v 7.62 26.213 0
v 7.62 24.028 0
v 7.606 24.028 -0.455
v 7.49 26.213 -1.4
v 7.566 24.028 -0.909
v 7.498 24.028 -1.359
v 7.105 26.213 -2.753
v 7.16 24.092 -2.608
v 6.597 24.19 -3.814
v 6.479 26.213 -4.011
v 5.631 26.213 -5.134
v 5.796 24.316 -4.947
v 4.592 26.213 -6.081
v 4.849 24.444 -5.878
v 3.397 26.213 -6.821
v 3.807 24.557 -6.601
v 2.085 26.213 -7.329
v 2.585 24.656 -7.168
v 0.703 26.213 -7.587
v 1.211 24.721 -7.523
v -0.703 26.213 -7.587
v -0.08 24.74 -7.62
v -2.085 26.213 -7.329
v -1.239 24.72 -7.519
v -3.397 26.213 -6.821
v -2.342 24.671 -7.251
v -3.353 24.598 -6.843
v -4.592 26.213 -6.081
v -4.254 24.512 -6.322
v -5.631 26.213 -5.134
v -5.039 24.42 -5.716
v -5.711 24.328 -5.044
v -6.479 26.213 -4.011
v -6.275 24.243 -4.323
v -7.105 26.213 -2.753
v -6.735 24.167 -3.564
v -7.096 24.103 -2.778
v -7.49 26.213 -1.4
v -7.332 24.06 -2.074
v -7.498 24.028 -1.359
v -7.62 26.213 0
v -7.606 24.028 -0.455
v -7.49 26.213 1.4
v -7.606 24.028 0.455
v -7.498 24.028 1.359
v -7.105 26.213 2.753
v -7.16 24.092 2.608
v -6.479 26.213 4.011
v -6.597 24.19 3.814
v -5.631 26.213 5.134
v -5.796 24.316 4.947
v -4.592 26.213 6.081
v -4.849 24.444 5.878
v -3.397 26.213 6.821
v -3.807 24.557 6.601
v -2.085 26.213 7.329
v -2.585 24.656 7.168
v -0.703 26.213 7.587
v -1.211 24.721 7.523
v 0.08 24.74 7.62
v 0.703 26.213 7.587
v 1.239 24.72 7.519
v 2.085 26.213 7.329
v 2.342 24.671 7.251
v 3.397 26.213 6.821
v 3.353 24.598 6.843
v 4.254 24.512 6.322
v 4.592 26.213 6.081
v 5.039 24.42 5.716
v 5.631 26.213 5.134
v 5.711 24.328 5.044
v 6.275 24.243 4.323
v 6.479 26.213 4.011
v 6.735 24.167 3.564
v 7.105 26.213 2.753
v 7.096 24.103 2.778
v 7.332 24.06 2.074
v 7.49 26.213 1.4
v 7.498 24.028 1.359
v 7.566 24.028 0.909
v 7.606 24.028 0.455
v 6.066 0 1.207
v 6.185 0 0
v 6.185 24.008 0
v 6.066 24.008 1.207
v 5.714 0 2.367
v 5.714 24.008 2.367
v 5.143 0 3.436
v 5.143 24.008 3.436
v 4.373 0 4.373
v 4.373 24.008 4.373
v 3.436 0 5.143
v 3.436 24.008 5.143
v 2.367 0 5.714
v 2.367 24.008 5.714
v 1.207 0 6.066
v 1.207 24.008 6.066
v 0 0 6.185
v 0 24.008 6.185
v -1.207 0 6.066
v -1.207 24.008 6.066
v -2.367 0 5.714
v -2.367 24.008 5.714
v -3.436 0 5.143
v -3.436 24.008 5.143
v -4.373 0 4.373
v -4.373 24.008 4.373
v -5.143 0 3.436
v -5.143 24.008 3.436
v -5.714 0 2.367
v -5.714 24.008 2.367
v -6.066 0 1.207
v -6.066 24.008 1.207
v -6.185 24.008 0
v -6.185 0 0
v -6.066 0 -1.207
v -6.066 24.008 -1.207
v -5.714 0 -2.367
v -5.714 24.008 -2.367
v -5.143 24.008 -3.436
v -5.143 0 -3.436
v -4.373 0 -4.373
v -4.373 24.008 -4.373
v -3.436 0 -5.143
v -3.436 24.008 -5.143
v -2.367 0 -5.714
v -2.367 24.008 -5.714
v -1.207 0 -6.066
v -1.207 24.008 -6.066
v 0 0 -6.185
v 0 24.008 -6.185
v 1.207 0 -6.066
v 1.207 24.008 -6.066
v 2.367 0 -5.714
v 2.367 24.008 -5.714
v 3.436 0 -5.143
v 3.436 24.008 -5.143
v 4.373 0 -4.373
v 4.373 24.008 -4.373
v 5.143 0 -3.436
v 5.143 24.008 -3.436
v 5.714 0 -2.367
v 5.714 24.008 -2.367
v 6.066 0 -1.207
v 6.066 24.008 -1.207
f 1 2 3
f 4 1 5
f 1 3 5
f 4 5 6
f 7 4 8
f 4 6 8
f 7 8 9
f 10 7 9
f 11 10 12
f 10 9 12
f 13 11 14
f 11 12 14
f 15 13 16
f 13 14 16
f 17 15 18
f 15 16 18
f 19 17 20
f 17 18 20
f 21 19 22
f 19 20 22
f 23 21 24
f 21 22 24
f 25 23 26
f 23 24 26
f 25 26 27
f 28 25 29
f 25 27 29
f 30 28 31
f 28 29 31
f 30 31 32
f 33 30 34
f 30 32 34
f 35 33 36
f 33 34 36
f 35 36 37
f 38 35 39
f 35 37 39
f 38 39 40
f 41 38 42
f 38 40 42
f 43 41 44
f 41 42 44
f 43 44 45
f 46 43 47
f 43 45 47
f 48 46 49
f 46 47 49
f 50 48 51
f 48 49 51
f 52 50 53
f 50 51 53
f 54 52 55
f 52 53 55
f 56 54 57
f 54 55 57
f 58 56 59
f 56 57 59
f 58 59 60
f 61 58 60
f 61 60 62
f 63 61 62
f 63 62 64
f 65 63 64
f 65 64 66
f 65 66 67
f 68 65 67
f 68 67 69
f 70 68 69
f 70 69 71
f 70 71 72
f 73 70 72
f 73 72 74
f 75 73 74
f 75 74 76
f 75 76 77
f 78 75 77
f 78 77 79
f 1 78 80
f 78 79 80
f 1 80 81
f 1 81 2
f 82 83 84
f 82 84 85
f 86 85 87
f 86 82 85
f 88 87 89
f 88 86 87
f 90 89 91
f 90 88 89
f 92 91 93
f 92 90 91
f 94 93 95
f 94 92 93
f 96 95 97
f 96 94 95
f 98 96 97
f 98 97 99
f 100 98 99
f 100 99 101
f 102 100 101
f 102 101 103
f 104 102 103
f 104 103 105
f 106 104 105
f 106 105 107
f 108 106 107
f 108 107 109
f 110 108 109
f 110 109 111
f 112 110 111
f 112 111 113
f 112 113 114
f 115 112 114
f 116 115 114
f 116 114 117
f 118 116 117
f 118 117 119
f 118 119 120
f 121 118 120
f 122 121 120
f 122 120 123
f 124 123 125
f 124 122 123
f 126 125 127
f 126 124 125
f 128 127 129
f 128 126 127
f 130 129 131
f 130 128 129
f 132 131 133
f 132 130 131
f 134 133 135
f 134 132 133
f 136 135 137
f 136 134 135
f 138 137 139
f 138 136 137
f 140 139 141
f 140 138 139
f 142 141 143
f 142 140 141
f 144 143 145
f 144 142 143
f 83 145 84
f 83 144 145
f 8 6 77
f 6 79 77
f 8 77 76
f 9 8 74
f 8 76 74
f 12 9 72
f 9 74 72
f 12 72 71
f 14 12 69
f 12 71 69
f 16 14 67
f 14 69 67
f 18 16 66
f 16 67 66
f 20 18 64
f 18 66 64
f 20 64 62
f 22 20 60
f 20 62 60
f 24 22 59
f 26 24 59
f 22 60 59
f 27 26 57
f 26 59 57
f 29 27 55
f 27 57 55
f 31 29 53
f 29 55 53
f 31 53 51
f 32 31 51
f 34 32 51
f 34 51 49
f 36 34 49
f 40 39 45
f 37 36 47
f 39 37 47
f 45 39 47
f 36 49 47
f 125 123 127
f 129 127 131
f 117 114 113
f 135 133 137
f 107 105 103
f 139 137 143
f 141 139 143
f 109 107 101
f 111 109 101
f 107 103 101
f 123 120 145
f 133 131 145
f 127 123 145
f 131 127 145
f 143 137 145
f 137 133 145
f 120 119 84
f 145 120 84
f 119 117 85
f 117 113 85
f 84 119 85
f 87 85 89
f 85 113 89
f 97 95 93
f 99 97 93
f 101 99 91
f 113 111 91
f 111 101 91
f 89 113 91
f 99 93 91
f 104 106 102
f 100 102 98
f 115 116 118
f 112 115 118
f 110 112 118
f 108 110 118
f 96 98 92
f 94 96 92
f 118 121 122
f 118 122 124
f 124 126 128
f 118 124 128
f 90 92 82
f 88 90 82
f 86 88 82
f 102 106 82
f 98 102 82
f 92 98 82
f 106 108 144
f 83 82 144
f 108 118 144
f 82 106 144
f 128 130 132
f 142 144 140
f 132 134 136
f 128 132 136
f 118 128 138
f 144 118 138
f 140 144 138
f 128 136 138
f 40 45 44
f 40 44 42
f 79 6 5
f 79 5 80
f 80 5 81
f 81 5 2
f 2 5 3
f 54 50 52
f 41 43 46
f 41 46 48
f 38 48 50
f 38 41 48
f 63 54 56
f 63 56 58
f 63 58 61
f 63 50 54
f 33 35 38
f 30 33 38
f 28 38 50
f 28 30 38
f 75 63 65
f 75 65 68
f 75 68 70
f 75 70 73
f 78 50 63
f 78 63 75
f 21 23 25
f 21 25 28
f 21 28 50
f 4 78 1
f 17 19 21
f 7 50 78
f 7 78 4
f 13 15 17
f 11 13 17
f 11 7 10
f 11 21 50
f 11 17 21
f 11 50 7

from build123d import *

# Parameters (mm, degrees)
SKETCH1_R               = 6.1849
BOSS_EXTRUDE1_DEPTH     = 23.9776
SKETCH2_R               = 7.62
BOSS_EXTRUDE2_DEPTH     = 2.2352
SKETCH4_R               = 7.62
SKETCH4_R_2             = 6.1849
CUT_EXTRUDE2_DEPTH      = 24.9776
CUT_EXTRUDE2_DEPTH_BACK = 0.0254
CUT_EXTRUDE3_DEPTH      = 8.62
CUT_EXTRUDE3_DEPTH_BACK = 8.62
SKETCH9_R               = 7.62
SKETCH9_R_2             = 6.1849
CUT_EXTRUDE4_DEPTH      = 25.003
CUT_EXTRUDE4_DEPTH_BACK = 0.0254


with BuildPart() as part:
    # Sketch1 → Boss-Extrude1 (new body)
    with BuildSketch(Plane(origin=(0, 0, 0), x_dir=(1, 0, 0), z_dir=(0, 1, 0))):
        Circle(SKETCH1_R)
    extrude(amount=BOSS_EXTRUDE1_DEPTH)

    # Sketch2 → Boss-Extrude2 (add)
    with BuildSketch(Plane(origin=(0, 23.9776, 0), x_dir=(1, 0, 0), z_dir=(0, 1, 0))):
        Circle(SKETCH2_R)
    extrude(amount=BOSS_EXTRUDE2_DEPTH)

    # Sketch4 → Cut-Extrude2 (cut, two sides)
    with BuildSketch(Plane.XZ.offset(-23.9776)) as cut_extrude2_sk:
        Circle(SKETCH4_R)
        Circle(SKETCH4_R_2, mode=Mode.SUBTRACT)
    extrude(amount=CUT_EXTRUDE2_DEPTH, mode=Mode.SUBTRACT)
    extrude(cut_extrude2_sk.sketch, amount=-CUT_EXTRUDE2_DEPTH_BACK, mode=Mode.SUBTRACT)

    # Sketch8 → Cut-Extrude3 (cut, two sides)
    with BuildSketch(Plane.XY) as cut_extrude3_sk:
        with BuildLine():
            Line((-7.601459966, 24.008409454), (7.601459966, 24.008409454))
            ThreePointArc((7.601459966, 24.008409454), (0, 24.7396), (-7.601459966, 24.008409454))
        make_face()
    extrude(amount=CUT_EXTRUDE3_DEPTH, mode=Mode.SUBTRACT)
    extrude(cut_extrude3_sk.sketch, amount=-CUT_EXTRUDE3_DEPTH_BACK, mode=Mode.SUBTRACT)

    # Sketch9 → Cut-Extrude4 (cut, two sides)
    with BuildSketch(Plane.XZ.offset(-24.003)) as cut_extrude4_sk:
        Circle(SKETCH9_R)
        Circle(SKETCH9_R_2, mode=Mode.SUBTRACT)
    extrude(amount=CUT_EXTRUDE4_DEPTH, mode=Mode.SUBTRACT)
    extrude(cut_extrude4_sk.sketch, amount=-CUT_EXTRUDE4_DEPTH_BACK, mode=Mode.SUBTRACT)


solid = part.part
